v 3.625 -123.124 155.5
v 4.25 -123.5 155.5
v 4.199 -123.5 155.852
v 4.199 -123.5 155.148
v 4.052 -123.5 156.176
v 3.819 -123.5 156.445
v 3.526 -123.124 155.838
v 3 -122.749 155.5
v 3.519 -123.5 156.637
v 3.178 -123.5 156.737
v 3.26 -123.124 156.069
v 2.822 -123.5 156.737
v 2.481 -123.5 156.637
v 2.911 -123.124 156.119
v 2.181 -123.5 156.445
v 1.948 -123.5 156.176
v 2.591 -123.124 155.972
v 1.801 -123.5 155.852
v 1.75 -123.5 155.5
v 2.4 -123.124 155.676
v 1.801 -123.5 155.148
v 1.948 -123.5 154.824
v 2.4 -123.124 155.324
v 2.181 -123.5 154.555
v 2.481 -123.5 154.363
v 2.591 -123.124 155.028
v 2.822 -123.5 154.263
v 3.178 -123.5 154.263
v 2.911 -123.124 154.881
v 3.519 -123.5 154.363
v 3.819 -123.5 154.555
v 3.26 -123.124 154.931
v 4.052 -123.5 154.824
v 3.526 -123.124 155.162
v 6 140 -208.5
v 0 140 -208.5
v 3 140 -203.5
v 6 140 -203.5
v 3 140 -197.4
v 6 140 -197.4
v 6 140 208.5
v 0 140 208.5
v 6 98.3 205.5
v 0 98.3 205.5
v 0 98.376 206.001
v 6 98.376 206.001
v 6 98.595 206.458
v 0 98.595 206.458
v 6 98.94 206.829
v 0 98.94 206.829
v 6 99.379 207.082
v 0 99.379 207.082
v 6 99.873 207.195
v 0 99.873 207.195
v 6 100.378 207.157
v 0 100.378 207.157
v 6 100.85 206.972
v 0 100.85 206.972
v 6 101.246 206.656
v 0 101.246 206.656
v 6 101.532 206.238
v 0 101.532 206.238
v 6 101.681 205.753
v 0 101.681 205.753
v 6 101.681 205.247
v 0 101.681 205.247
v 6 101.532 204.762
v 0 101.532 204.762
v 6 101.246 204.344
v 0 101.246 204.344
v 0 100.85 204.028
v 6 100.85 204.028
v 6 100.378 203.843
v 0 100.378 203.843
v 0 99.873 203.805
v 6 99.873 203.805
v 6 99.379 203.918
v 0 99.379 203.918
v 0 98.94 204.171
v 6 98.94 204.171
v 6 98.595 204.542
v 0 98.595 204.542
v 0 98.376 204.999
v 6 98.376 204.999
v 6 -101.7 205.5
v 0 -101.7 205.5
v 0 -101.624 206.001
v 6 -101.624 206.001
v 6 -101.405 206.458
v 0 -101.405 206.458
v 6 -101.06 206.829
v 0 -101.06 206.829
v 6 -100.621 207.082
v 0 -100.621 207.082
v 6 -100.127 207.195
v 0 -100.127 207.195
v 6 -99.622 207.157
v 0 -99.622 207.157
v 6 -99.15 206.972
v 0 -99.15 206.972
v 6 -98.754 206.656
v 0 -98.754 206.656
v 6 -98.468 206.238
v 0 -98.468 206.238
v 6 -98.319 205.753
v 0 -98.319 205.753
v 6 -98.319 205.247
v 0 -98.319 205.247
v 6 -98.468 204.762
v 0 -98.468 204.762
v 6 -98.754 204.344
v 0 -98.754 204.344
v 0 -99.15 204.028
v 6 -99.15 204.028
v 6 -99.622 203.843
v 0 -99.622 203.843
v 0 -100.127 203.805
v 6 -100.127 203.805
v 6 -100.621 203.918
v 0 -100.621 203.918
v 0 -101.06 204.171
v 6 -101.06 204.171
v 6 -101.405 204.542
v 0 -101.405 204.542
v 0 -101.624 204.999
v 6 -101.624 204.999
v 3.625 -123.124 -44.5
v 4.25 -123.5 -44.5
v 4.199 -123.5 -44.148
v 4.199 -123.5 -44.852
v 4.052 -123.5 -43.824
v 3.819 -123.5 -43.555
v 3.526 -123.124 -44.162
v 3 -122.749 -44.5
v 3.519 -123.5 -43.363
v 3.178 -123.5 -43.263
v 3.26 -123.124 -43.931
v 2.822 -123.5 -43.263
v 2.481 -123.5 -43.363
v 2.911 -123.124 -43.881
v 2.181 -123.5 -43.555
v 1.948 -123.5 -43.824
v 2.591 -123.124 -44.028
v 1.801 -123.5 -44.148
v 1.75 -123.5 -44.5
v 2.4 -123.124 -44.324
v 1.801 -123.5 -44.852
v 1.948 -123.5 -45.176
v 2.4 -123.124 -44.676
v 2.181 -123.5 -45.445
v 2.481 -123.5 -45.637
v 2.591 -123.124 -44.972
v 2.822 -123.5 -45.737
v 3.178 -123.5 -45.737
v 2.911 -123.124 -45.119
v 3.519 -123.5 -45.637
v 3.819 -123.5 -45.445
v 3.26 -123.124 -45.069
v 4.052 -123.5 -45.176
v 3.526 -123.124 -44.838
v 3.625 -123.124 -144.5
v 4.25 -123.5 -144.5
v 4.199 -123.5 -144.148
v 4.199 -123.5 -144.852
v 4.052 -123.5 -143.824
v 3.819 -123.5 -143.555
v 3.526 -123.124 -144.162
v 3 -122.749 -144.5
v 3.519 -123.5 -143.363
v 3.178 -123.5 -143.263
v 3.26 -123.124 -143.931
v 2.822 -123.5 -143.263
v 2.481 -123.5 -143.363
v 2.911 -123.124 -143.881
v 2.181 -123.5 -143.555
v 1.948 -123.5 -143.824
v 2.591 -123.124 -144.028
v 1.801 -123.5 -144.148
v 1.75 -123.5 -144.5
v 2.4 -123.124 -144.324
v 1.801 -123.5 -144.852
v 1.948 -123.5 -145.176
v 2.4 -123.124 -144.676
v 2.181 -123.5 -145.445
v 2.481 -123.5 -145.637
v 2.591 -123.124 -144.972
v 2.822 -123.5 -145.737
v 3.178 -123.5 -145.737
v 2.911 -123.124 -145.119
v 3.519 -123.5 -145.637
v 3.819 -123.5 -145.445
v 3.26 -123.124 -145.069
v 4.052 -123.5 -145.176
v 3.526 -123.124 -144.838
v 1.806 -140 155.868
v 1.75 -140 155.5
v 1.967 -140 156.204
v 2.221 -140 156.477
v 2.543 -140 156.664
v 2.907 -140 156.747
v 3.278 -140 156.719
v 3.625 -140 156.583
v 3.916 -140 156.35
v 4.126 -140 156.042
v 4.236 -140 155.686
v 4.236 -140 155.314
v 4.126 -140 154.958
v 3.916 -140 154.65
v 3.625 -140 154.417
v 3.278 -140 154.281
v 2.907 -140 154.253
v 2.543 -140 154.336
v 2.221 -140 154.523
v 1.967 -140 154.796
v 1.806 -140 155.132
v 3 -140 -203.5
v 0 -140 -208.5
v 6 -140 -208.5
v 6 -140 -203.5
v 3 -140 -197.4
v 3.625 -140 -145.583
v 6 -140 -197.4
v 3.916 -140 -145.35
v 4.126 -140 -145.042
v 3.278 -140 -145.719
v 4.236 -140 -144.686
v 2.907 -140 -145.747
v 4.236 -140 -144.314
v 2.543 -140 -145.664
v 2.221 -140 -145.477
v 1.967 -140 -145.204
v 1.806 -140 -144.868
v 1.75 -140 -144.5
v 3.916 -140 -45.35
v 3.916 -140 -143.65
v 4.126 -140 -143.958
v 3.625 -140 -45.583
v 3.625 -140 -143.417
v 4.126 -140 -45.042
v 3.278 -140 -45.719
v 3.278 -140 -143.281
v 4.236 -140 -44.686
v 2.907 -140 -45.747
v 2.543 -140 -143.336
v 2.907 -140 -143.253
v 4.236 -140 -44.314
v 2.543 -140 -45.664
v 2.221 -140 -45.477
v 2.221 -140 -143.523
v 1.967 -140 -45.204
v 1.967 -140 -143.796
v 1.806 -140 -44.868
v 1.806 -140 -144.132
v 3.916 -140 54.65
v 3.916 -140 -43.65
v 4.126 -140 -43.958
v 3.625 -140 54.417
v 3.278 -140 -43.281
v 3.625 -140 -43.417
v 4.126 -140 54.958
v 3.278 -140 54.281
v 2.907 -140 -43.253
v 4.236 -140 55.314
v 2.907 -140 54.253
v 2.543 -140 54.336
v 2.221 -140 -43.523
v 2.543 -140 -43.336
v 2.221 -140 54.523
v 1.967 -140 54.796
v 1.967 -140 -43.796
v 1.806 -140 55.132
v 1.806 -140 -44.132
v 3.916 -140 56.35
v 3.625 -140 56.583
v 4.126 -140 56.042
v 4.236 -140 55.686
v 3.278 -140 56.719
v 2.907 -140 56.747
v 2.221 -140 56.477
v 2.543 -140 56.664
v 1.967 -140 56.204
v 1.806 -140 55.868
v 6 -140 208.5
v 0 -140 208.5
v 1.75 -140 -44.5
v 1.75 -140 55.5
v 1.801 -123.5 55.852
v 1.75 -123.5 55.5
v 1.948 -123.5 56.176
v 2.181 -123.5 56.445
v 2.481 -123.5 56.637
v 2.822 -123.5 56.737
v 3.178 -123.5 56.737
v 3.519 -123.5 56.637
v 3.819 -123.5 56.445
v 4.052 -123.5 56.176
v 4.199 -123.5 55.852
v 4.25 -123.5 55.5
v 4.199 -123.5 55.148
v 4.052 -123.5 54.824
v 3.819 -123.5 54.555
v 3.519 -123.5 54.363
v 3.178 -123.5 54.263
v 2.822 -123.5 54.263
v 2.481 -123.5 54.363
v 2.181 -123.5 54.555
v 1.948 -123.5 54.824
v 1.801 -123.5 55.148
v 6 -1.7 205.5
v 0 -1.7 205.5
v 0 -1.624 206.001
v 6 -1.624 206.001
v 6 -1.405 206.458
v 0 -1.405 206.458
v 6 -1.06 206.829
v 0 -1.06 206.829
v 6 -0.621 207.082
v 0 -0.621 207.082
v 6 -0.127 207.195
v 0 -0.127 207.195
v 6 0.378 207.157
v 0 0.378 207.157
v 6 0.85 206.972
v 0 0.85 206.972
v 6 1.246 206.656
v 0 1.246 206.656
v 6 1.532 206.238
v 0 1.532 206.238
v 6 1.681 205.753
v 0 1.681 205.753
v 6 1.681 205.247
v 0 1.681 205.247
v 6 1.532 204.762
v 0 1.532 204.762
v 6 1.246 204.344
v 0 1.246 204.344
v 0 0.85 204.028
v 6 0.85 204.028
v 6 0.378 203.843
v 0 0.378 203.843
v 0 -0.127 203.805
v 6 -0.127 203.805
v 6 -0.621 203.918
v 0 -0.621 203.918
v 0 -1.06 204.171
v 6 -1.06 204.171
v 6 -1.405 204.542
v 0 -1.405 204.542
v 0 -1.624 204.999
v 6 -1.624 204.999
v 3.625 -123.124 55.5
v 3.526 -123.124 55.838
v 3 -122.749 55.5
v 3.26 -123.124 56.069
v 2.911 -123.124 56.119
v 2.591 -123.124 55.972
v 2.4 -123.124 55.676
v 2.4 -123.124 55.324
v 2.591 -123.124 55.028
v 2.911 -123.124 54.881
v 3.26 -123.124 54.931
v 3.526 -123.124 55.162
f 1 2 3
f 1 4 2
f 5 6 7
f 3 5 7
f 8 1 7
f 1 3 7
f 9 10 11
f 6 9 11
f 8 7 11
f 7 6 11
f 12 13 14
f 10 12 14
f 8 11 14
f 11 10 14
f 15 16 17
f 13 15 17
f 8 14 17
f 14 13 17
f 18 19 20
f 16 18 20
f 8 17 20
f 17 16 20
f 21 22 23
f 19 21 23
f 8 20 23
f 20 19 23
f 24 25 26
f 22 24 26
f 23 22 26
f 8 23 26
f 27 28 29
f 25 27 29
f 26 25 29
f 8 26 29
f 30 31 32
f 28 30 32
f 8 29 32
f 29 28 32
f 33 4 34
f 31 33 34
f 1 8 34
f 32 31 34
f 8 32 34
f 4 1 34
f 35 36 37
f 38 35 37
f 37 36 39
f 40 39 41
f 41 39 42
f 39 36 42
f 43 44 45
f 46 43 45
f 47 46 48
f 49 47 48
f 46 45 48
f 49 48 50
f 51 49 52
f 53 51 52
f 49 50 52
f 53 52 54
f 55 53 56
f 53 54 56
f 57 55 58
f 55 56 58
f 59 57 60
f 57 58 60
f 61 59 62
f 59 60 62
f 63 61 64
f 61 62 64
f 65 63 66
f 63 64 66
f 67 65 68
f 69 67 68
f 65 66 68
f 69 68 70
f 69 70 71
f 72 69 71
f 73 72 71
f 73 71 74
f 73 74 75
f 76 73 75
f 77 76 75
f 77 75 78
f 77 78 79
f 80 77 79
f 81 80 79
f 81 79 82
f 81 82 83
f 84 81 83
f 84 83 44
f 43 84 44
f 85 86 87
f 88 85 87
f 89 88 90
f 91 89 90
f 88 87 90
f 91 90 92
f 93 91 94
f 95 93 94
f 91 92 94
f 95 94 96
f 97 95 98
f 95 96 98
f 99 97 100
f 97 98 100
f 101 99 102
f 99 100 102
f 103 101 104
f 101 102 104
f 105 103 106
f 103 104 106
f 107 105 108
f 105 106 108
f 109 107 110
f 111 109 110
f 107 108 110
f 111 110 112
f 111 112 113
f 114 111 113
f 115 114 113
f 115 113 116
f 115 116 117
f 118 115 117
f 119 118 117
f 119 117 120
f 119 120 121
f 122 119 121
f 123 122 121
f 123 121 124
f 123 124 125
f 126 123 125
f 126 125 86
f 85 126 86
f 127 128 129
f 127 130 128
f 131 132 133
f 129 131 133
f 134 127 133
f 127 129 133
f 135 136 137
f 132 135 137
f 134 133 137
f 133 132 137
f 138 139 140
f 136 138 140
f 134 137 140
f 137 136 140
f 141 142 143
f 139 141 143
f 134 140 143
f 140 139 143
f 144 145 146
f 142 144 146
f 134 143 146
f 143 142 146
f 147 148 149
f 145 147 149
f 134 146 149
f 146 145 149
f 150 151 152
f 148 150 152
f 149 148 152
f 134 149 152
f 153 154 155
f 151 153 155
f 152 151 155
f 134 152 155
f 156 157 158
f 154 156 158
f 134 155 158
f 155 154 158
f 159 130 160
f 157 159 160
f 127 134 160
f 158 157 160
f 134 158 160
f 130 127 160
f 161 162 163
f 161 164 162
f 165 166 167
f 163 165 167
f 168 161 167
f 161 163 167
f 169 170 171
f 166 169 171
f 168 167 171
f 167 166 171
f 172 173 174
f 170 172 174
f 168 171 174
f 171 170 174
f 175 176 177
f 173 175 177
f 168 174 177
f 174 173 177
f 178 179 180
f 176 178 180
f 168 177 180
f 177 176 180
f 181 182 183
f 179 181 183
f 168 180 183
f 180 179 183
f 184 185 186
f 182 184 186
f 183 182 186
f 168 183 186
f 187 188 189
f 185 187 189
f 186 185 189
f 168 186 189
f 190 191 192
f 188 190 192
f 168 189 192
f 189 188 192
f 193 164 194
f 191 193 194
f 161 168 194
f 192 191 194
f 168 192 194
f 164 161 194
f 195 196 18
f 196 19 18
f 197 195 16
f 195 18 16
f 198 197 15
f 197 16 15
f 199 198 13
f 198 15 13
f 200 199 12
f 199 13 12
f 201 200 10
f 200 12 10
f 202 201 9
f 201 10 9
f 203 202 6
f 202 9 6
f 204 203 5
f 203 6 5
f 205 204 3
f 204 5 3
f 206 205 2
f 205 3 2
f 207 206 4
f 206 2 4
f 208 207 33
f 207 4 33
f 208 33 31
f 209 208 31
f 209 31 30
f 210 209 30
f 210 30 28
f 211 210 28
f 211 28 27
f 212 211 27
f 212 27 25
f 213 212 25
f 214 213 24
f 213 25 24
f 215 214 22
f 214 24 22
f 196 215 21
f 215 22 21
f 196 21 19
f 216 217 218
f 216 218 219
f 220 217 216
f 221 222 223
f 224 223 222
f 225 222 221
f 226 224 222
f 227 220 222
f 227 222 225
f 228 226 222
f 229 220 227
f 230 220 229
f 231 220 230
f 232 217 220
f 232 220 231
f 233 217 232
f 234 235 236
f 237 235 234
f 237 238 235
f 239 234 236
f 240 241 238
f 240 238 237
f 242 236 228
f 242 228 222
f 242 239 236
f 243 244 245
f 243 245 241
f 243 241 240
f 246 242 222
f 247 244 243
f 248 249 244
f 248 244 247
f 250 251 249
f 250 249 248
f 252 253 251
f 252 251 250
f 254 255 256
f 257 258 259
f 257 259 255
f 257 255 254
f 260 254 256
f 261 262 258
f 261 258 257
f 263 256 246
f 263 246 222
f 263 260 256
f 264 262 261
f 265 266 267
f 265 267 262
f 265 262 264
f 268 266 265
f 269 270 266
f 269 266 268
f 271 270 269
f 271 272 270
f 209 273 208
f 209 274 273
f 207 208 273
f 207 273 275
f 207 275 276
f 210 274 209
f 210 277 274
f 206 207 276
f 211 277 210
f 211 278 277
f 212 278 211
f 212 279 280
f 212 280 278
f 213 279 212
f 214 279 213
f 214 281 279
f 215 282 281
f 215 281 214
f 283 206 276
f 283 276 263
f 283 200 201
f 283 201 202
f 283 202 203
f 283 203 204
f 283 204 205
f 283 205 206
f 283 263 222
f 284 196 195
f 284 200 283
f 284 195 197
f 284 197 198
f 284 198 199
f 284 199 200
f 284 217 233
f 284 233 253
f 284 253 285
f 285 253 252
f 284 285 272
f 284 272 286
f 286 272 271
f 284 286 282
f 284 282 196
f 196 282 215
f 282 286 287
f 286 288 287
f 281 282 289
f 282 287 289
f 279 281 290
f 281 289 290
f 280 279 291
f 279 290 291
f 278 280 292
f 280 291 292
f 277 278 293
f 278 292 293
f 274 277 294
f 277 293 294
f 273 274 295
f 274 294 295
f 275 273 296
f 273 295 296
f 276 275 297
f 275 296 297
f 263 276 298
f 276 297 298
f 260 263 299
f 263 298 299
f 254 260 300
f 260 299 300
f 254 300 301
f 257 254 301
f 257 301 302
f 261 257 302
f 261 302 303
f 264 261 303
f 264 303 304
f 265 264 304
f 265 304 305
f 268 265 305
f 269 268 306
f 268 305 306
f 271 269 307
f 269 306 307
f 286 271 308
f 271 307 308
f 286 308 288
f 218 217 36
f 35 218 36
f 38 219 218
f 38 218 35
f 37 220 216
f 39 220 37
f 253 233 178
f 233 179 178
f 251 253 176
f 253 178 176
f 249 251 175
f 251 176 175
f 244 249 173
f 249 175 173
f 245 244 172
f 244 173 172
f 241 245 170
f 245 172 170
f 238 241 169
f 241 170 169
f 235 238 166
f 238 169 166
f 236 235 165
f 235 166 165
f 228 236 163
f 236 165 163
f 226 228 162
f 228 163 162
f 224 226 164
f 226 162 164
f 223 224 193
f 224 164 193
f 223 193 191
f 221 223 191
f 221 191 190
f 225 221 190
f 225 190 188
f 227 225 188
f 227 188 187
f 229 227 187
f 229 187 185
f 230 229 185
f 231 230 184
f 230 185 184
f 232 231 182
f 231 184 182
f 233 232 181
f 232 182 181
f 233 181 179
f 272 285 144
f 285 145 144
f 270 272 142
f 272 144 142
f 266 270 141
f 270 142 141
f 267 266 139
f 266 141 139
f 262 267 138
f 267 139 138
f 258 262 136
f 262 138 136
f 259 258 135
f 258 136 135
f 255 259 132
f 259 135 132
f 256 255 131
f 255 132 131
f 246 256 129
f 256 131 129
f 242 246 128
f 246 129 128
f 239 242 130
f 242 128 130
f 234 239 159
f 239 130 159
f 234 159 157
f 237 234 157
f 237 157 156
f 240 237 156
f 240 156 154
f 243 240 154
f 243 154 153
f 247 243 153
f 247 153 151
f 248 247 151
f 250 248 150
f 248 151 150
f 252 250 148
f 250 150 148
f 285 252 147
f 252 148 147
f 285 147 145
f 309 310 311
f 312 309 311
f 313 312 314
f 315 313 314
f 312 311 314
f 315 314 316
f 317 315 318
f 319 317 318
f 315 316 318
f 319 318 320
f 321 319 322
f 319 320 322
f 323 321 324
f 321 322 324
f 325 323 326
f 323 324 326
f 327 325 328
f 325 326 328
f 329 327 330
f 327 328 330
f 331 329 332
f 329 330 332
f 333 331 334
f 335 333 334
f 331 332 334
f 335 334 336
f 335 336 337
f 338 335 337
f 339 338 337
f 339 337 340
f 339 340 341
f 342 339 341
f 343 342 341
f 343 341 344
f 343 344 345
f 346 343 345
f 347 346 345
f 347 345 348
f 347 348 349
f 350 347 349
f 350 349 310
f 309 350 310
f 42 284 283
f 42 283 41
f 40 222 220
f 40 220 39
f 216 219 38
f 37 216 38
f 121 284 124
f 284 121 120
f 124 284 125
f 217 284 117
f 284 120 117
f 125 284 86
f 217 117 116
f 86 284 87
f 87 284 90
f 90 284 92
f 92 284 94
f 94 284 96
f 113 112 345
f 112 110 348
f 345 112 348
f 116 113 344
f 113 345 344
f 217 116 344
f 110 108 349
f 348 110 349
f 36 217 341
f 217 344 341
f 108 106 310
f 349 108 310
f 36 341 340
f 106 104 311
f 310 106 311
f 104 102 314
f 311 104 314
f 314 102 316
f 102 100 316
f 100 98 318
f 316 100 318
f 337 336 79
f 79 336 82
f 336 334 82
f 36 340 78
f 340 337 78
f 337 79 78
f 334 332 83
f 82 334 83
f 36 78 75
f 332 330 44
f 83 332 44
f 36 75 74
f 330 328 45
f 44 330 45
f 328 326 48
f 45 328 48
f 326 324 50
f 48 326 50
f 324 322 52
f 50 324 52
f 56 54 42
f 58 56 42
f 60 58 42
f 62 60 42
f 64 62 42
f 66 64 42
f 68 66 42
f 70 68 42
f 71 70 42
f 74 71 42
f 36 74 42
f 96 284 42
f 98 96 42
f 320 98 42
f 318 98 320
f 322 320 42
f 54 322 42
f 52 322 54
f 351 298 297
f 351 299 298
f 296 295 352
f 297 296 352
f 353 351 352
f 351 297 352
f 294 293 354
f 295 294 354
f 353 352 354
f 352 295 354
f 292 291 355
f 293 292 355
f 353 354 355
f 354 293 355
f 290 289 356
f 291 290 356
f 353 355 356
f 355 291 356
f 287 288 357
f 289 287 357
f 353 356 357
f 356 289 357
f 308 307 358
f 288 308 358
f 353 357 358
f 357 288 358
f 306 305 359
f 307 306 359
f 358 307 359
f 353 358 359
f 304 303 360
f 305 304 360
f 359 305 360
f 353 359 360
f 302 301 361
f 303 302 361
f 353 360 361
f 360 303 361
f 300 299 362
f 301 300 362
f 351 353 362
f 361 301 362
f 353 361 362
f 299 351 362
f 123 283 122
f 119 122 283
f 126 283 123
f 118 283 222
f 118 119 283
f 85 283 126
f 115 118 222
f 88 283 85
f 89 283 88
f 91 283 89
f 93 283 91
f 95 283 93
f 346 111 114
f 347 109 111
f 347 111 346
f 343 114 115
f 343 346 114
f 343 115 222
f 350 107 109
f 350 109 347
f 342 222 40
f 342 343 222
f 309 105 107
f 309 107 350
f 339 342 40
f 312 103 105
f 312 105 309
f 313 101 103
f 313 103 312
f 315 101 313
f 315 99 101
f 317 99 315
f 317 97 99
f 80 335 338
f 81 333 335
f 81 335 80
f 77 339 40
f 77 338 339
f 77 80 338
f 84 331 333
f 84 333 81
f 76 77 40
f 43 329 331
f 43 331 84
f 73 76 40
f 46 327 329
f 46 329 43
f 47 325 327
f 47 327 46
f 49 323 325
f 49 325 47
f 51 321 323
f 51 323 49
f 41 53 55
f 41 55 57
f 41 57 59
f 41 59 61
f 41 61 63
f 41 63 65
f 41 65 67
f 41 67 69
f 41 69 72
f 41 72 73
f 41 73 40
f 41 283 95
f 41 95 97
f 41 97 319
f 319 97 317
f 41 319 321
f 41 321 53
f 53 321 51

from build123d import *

# Parameters (mm, degrees)
F0_W     = 280
F0_H     = 417
F1_DEPTH = 6
F3_D     = 3.4
F4_W     = 280
F4_H     = 6.1
F5_DEPTH = 3
F8_D     = 2.5
F8_DEPTH = 16.5
F8_TIP   = 0.7510757738
F9_D     = 2.5
F9_DEPTH = 16.5
F9_TIP   = 0.7510757738


# Not quite as in the source:
# - a feature names something its author has since deleted; it is built from what else it names


with BuildPart() as f1:
    # F0 (on Right) → F1 (new body)
    with BuildSketch(Plane.YZ):
        Rectangle(F0_W, F0_H)
    extrude(amount=F1_DEPTH)

    # F3 (through all)
    with Locations(Plane.YZ.offset(6)):
        with Locations((100, 205.5), (0, 205.5), (-100, 205.5)):
            Hole(F3_D / 2)


with BuildPart() as f5:
    # F4 (on face) → F5 (new body)
    with BuildSketch(Plane.YZ.offset(6)):
        with Locations((0, -200.45)):
            Rectangle(F4_W, F4_H)
    extrude(amount=-F5_DEPTH)


with BuildPart() as f1_1:
    add(f1.part)

    # F6: cut F5
    add(f5.part, mode=Mode.SUBTRACT)

    # F8
    with Locations(Plane.XZ.offset(140)):
        with Locations((3, 155.5), (3, 55.5), (3, -44.5)):
            Hole(F8_D / 2, depth=F8_DEPTH)
            with Locations((0, 0, -(F8_DEPTH + F8_TIP / 2))):  # 118° drill point
                Cone(0, F8_D / 2, F8_TIP, mode=Mode.SUBTRACT)

    # F9
    with Locations(Plane.XZ.offset(140)):
        with Locations((3, -144.5)):
            Hole(F9_D / 2, depth=F9_DEPTH)
            with Locations((0, 0, -(F9_DEPTH + F9_TIP / 2))):  # 118° drill point
                Cone(0, F9_D / 2, F9_TIP, mode=Mode.SUBTRACT)


solid = f1_1.part
